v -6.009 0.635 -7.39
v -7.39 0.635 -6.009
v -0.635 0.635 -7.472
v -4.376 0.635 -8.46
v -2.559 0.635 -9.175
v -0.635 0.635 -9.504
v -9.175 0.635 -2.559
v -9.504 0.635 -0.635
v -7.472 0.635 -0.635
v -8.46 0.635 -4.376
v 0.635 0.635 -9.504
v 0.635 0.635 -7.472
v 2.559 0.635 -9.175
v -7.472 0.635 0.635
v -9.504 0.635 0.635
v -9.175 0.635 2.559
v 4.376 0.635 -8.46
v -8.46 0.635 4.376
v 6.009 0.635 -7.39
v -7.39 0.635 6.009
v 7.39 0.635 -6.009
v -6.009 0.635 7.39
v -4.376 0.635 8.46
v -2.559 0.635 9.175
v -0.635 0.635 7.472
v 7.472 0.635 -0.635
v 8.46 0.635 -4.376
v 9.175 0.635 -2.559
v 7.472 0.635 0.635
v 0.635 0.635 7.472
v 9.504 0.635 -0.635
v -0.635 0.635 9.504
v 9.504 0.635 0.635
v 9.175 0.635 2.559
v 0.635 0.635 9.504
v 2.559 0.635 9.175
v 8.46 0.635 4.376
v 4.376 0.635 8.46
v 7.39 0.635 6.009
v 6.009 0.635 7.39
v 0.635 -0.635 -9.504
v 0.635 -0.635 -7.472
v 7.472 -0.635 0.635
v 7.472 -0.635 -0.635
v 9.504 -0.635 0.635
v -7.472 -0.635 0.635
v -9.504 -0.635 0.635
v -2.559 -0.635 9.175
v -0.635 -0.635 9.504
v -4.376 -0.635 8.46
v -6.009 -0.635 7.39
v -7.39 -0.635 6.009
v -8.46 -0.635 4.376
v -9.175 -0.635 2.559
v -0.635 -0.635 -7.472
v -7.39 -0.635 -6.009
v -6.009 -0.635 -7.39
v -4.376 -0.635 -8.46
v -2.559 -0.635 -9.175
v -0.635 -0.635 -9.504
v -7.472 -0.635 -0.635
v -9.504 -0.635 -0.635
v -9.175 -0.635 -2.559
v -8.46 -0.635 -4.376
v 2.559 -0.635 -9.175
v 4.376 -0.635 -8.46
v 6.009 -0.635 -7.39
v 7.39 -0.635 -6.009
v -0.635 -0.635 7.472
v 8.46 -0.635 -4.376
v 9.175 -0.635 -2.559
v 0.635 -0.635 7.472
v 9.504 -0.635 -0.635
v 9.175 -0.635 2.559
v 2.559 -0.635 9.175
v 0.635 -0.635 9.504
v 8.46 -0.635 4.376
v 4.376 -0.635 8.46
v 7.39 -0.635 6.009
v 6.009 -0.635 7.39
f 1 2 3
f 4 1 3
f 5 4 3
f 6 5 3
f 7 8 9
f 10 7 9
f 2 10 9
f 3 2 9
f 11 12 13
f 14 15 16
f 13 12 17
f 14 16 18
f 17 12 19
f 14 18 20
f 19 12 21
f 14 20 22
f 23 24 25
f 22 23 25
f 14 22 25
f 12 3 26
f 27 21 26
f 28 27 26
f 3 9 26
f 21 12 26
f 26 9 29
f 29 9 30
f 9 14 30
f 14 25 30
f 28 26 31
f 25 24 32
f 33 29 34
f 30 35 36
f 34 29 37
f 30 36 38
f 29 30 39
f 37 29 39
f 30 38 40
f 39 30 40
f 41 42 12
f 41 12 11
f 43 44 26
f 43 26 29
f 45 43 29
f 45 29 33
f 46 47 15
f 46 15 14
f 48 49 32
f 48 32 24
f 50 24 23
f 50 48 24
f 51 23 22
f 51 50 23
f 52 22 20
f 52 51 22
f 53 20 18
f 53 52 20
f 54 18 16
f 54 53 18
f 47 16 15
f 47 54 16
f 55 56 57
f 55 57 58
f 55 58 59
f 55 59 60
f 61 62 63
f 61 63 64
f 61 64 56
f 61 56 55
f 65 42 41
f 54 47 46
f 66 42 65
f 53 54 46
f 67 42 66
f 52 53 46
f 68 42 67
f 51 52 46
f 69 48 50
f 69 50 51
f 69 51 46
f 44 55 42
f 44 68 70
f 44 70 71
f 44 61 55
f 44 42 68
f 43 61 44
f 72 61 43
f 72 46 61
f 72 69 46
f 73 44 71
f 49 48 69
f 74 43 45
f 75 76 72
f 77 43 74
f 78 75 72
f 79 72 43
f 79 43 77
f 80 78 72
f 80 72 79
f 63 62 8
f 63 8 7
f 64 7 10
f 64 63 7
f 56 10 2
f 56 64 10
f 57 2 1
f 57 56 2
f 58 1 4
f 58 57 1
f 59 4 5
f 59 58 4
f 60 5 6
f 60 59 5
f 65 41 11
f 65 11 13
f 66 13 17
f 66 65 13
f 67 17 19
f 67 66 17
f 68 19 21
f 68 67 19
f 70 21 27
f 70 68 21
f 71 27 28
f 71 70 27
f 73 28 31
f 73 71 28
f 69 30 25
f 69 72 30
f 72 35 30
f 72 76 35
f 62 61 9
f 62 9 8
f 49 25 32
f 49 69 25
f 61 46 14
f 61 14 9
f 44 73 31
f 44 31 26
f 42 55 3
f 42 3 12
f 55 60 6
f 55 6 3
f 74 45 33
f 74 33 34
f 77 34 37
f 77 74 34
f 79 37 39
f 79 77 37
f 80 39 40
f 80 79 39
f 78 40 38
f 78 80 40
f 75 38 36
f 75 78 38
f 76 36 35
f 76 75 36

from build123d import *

# Parameters (mm, degrees)
F1_DEPTH = 0.635


with BuildPart() as f1:
    # F0 (on Front) → F1 (new body, symmetric)
    with BuildSketch(Plane.XZ):
        with BuildLine():
            Line((-0.635, 7.47181), (-0.635, 9.50381))
            ThreePointArc((-0.635, 9.50381), (-6.735192, 6.735192), (-9.50381, 0.635))
            Line((-9.50381, 0.635), (-7.47181, 0.635))
            Line((-7.47181, 0.635), (-7.47181, -0.635))
            Line((-7.47181, -0.635), (-9.50381, -0.635))
            ThreePointArc((-9.50381, -0.635), (-6.735192, -6.735192), (-0.635, -9.50381))
            Line((-0.635, -9.50381), (-0.635, -7.47181))
            Line((-0.635, -7.47181), (0.635, -7.47181))
            Line((0.635, -7.47181), (0.635, -9.50381))
            ThreePointArc((0.635, -9.50381), (6.735192, -6.735192), (9.50381, -0.635))
            Line((9.50381, -0.635), (7.47181, -0.635))
            Line((7.47181, -0.635), (7.47181, 0.635))
            Line((7.47181, 0.635), (9.50381, 0.635))
            ThreePointArc((9.50381, 0.635), (6.735192, 6.735192), (0.635, 9.50381))
            Line((0.635, 9.50381), (0.635, 7.47181))
            Line((0.635, 7.47181), (-0.635, 7.47181))
        make_face()
    extrude(amount=F1_DEPTH, both=True)


solid = f1.part
